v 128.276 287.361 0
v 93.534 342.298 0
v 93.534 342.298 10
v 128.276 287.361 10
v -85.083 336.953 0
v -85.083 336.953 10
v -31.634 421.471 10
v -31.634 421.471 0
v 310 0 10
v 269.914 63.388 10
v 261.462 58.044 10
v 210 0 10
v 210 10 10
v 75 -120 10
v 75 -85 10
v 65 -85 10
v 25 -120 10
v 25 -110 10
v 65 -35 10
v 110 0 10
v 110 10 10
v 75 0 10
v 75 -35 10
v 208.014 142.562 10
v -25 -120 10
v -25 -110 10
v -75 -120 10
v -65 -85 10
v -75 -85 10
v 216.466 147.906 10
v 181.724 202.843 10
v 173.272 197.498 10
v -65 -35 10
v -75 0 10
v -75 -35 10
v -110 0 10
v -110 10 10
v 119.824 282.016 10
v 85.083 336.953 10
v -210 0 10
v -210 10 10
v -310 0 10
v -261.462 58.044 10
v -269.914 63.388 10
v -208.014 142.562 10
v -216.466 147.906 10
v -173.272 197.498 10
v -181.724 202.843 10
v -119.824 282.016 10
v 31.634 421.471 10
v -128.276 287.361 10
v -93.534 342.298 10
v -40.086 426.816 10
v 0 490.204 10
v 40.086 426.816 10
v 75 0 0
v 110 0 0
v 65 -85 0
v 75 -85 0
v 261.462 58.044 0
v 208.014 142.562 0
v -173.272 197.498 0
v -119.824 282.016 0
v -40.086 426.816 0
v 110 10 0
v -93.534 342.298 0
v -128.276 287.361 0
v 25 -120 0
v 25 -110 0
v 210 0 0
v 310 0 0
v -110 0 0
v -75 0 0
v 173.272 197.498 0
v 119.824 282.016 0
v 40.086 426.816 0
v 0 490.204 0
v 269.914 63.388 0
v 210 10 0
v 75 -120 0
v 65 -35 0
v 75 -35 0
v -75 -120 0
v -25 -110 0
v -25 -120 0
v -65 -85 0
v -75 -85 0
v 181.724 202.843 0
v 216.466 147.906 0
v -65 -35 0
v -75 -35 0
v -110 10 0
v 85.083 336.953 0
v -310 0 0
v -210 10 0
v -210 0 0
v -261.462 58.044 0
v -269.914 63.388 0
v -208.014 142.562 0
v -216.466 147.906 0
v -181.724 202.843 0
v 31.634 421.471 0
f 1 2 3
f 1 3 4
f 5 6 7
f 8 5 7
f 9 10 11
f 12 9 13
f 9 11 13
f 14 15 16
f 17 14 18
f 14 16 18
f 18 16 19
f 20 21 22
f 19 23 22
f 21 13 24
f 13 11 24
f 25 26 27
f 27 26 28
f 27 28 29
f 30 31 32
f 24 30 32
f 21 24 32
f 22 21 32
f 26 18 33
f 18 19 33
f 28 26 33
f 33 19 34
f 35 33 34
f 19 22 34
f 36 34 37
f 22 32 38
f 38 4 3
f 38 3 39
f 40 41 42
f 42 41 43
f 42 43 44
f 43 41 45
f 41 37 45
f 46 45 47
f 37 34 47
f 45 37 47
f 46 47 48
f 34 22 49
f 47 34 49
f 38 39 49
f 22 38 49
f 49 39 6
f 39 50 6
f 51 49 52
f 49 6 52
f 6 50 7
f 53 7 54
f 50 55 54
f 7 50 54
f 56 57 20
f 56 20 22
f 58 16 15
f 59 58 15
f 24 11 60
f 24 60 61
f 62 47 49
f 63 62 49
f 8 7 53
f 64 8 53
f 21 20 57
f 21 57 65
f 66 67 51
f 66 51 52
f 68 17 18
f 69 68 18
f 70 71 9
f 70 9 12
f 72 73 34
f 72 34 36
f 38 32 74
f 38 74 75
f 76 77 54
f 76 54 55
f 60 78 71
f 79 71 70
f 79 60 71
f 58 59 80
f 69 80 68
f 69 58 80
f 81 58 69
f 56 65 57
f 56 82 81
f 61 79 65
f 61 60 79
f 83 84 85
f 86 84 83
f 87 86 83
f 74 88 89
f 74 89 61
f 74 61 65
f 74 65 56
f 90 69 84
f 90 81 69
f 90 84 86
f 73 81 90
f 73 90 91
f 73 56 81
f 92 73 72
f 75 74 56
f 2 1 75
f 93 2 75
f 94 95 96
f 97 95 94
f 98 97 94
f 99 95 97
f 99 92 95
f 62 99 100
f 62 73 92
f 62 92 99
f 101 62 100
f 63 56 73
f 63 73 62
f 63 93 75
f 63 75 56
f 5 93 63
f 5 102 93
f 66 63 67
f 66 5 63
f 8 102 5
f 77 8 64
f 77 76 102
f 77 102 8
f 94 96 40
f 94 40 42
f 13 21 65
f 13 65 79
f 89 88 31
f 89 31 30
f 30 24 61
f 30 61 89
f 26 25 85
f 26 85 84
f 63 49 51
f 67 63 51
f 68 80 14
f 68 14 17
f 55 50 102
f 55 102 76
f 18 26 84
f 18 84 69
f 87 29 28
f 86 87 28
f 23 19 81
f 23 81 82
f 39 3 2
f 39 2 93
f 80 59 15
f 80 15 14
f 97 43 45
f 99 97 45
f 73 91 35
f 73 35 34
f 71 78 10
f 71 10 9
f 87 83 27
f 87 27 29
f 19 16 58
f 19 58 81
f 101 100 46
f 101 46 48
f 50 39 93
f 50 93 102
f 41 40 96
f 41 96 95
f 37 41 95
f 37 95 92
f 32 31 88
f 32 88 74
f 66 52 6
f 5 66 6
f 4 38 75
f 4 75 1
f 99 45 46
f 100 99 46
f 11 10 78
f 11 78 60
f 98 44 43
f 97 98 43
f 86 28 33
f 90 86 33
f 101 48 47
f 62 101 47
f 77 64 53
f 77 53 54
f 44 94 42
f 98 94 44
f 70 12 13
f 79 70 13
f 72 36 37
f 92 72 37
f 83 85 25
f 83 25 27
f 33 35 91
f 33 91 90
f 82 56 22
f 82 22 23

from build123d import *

# Parameters (mm, degrees)
BOSS_EXTRU_1_DEPTH      = 10
ESQUISSE2_W             = 100
ESQUISSE2_H             = 10
ESQUISSE2_W_2           = 10
ESQUISSE2_H_2           = 50
ESQUISSE2_W_3           = 50
ENL_V_MAT_EXTRU_1_DEPTH = 10


with BuildPart() as part:
    # Esquisse1 → Boss.-Extru.1 (new body)
    with BuildSketch(Plane.XY):
        Polygon((-310, 0), (0, 490.204039151), (310, 0), (75, 0), (75, -120), (-75, -120), (-75, 0), align=None)
    extrude(amount=BOSS_EXTRU_1_DEPTH)

    # Esquisse2 → Enlèv. mat.-Extru.1 (cut)
    with BuildSketch(Plane.XY.offset(10)):
        Polygon((-269.913793103, 63.388453338), (-261.461999325, 58.043625752), (-208.013723463, 142.561563537), (-216.465517241, 147.906391123), align=None)
        Polygon((-181.724137931, 202.843050683), (-173.272344153, 197.498223097), (-119.82406829, 282.016160882), (-128.275862069, 287.360988468), align=None)
        Polygon((-93.534482759, 342.297648028), (-85.08268898, 336.952820442), (-31.634413118, 421.470758226), (-40.086206897, 426.815585813), align=None)
        Polygon((208.013723463, 142.561563537), (216.465517241, 147.906391123), (269.913793103, 63.388453338), (261.461999325, 58.043625752), align=None)
        Polygon((31.634413118, 421.470758226), (40.086206897, 426.815585813), (93.534482759, 342.297648028), (85.08268898, 336.952820442), align=None)
        Polygon((119.82406829, 282.016160882), (128.275862069, 287.360988468), (181.724137931, 202.843050683), (173.272344153, 197.498223097), align=None)
        with Locations((-160, 5)):
            Rectangle(ESQUISSE2_W, ESQUISSE2_H)
        with Locations((160, 5)):
            Rectangle(ESQUISSE2_W, ESQUISSE2_H)
        with Locations((-70, -60)):
            Rectangle(ESQUISSE2_W_2, ESQUISSE2_H_2)
        with Locations((70, -60)):
            Rectangle(ESQUISSE2_W_2, ESQUISSE2_H_2)
        with Locations((0, -115)):
            Rectangle(ESQUISSE2_W_3, ESQUISSE2_H)
    extrude(amount=-ENL_V_MAT_EXTRU_1_DEPTH, mode=Mode.SUBTRACT)


solid = part.part
